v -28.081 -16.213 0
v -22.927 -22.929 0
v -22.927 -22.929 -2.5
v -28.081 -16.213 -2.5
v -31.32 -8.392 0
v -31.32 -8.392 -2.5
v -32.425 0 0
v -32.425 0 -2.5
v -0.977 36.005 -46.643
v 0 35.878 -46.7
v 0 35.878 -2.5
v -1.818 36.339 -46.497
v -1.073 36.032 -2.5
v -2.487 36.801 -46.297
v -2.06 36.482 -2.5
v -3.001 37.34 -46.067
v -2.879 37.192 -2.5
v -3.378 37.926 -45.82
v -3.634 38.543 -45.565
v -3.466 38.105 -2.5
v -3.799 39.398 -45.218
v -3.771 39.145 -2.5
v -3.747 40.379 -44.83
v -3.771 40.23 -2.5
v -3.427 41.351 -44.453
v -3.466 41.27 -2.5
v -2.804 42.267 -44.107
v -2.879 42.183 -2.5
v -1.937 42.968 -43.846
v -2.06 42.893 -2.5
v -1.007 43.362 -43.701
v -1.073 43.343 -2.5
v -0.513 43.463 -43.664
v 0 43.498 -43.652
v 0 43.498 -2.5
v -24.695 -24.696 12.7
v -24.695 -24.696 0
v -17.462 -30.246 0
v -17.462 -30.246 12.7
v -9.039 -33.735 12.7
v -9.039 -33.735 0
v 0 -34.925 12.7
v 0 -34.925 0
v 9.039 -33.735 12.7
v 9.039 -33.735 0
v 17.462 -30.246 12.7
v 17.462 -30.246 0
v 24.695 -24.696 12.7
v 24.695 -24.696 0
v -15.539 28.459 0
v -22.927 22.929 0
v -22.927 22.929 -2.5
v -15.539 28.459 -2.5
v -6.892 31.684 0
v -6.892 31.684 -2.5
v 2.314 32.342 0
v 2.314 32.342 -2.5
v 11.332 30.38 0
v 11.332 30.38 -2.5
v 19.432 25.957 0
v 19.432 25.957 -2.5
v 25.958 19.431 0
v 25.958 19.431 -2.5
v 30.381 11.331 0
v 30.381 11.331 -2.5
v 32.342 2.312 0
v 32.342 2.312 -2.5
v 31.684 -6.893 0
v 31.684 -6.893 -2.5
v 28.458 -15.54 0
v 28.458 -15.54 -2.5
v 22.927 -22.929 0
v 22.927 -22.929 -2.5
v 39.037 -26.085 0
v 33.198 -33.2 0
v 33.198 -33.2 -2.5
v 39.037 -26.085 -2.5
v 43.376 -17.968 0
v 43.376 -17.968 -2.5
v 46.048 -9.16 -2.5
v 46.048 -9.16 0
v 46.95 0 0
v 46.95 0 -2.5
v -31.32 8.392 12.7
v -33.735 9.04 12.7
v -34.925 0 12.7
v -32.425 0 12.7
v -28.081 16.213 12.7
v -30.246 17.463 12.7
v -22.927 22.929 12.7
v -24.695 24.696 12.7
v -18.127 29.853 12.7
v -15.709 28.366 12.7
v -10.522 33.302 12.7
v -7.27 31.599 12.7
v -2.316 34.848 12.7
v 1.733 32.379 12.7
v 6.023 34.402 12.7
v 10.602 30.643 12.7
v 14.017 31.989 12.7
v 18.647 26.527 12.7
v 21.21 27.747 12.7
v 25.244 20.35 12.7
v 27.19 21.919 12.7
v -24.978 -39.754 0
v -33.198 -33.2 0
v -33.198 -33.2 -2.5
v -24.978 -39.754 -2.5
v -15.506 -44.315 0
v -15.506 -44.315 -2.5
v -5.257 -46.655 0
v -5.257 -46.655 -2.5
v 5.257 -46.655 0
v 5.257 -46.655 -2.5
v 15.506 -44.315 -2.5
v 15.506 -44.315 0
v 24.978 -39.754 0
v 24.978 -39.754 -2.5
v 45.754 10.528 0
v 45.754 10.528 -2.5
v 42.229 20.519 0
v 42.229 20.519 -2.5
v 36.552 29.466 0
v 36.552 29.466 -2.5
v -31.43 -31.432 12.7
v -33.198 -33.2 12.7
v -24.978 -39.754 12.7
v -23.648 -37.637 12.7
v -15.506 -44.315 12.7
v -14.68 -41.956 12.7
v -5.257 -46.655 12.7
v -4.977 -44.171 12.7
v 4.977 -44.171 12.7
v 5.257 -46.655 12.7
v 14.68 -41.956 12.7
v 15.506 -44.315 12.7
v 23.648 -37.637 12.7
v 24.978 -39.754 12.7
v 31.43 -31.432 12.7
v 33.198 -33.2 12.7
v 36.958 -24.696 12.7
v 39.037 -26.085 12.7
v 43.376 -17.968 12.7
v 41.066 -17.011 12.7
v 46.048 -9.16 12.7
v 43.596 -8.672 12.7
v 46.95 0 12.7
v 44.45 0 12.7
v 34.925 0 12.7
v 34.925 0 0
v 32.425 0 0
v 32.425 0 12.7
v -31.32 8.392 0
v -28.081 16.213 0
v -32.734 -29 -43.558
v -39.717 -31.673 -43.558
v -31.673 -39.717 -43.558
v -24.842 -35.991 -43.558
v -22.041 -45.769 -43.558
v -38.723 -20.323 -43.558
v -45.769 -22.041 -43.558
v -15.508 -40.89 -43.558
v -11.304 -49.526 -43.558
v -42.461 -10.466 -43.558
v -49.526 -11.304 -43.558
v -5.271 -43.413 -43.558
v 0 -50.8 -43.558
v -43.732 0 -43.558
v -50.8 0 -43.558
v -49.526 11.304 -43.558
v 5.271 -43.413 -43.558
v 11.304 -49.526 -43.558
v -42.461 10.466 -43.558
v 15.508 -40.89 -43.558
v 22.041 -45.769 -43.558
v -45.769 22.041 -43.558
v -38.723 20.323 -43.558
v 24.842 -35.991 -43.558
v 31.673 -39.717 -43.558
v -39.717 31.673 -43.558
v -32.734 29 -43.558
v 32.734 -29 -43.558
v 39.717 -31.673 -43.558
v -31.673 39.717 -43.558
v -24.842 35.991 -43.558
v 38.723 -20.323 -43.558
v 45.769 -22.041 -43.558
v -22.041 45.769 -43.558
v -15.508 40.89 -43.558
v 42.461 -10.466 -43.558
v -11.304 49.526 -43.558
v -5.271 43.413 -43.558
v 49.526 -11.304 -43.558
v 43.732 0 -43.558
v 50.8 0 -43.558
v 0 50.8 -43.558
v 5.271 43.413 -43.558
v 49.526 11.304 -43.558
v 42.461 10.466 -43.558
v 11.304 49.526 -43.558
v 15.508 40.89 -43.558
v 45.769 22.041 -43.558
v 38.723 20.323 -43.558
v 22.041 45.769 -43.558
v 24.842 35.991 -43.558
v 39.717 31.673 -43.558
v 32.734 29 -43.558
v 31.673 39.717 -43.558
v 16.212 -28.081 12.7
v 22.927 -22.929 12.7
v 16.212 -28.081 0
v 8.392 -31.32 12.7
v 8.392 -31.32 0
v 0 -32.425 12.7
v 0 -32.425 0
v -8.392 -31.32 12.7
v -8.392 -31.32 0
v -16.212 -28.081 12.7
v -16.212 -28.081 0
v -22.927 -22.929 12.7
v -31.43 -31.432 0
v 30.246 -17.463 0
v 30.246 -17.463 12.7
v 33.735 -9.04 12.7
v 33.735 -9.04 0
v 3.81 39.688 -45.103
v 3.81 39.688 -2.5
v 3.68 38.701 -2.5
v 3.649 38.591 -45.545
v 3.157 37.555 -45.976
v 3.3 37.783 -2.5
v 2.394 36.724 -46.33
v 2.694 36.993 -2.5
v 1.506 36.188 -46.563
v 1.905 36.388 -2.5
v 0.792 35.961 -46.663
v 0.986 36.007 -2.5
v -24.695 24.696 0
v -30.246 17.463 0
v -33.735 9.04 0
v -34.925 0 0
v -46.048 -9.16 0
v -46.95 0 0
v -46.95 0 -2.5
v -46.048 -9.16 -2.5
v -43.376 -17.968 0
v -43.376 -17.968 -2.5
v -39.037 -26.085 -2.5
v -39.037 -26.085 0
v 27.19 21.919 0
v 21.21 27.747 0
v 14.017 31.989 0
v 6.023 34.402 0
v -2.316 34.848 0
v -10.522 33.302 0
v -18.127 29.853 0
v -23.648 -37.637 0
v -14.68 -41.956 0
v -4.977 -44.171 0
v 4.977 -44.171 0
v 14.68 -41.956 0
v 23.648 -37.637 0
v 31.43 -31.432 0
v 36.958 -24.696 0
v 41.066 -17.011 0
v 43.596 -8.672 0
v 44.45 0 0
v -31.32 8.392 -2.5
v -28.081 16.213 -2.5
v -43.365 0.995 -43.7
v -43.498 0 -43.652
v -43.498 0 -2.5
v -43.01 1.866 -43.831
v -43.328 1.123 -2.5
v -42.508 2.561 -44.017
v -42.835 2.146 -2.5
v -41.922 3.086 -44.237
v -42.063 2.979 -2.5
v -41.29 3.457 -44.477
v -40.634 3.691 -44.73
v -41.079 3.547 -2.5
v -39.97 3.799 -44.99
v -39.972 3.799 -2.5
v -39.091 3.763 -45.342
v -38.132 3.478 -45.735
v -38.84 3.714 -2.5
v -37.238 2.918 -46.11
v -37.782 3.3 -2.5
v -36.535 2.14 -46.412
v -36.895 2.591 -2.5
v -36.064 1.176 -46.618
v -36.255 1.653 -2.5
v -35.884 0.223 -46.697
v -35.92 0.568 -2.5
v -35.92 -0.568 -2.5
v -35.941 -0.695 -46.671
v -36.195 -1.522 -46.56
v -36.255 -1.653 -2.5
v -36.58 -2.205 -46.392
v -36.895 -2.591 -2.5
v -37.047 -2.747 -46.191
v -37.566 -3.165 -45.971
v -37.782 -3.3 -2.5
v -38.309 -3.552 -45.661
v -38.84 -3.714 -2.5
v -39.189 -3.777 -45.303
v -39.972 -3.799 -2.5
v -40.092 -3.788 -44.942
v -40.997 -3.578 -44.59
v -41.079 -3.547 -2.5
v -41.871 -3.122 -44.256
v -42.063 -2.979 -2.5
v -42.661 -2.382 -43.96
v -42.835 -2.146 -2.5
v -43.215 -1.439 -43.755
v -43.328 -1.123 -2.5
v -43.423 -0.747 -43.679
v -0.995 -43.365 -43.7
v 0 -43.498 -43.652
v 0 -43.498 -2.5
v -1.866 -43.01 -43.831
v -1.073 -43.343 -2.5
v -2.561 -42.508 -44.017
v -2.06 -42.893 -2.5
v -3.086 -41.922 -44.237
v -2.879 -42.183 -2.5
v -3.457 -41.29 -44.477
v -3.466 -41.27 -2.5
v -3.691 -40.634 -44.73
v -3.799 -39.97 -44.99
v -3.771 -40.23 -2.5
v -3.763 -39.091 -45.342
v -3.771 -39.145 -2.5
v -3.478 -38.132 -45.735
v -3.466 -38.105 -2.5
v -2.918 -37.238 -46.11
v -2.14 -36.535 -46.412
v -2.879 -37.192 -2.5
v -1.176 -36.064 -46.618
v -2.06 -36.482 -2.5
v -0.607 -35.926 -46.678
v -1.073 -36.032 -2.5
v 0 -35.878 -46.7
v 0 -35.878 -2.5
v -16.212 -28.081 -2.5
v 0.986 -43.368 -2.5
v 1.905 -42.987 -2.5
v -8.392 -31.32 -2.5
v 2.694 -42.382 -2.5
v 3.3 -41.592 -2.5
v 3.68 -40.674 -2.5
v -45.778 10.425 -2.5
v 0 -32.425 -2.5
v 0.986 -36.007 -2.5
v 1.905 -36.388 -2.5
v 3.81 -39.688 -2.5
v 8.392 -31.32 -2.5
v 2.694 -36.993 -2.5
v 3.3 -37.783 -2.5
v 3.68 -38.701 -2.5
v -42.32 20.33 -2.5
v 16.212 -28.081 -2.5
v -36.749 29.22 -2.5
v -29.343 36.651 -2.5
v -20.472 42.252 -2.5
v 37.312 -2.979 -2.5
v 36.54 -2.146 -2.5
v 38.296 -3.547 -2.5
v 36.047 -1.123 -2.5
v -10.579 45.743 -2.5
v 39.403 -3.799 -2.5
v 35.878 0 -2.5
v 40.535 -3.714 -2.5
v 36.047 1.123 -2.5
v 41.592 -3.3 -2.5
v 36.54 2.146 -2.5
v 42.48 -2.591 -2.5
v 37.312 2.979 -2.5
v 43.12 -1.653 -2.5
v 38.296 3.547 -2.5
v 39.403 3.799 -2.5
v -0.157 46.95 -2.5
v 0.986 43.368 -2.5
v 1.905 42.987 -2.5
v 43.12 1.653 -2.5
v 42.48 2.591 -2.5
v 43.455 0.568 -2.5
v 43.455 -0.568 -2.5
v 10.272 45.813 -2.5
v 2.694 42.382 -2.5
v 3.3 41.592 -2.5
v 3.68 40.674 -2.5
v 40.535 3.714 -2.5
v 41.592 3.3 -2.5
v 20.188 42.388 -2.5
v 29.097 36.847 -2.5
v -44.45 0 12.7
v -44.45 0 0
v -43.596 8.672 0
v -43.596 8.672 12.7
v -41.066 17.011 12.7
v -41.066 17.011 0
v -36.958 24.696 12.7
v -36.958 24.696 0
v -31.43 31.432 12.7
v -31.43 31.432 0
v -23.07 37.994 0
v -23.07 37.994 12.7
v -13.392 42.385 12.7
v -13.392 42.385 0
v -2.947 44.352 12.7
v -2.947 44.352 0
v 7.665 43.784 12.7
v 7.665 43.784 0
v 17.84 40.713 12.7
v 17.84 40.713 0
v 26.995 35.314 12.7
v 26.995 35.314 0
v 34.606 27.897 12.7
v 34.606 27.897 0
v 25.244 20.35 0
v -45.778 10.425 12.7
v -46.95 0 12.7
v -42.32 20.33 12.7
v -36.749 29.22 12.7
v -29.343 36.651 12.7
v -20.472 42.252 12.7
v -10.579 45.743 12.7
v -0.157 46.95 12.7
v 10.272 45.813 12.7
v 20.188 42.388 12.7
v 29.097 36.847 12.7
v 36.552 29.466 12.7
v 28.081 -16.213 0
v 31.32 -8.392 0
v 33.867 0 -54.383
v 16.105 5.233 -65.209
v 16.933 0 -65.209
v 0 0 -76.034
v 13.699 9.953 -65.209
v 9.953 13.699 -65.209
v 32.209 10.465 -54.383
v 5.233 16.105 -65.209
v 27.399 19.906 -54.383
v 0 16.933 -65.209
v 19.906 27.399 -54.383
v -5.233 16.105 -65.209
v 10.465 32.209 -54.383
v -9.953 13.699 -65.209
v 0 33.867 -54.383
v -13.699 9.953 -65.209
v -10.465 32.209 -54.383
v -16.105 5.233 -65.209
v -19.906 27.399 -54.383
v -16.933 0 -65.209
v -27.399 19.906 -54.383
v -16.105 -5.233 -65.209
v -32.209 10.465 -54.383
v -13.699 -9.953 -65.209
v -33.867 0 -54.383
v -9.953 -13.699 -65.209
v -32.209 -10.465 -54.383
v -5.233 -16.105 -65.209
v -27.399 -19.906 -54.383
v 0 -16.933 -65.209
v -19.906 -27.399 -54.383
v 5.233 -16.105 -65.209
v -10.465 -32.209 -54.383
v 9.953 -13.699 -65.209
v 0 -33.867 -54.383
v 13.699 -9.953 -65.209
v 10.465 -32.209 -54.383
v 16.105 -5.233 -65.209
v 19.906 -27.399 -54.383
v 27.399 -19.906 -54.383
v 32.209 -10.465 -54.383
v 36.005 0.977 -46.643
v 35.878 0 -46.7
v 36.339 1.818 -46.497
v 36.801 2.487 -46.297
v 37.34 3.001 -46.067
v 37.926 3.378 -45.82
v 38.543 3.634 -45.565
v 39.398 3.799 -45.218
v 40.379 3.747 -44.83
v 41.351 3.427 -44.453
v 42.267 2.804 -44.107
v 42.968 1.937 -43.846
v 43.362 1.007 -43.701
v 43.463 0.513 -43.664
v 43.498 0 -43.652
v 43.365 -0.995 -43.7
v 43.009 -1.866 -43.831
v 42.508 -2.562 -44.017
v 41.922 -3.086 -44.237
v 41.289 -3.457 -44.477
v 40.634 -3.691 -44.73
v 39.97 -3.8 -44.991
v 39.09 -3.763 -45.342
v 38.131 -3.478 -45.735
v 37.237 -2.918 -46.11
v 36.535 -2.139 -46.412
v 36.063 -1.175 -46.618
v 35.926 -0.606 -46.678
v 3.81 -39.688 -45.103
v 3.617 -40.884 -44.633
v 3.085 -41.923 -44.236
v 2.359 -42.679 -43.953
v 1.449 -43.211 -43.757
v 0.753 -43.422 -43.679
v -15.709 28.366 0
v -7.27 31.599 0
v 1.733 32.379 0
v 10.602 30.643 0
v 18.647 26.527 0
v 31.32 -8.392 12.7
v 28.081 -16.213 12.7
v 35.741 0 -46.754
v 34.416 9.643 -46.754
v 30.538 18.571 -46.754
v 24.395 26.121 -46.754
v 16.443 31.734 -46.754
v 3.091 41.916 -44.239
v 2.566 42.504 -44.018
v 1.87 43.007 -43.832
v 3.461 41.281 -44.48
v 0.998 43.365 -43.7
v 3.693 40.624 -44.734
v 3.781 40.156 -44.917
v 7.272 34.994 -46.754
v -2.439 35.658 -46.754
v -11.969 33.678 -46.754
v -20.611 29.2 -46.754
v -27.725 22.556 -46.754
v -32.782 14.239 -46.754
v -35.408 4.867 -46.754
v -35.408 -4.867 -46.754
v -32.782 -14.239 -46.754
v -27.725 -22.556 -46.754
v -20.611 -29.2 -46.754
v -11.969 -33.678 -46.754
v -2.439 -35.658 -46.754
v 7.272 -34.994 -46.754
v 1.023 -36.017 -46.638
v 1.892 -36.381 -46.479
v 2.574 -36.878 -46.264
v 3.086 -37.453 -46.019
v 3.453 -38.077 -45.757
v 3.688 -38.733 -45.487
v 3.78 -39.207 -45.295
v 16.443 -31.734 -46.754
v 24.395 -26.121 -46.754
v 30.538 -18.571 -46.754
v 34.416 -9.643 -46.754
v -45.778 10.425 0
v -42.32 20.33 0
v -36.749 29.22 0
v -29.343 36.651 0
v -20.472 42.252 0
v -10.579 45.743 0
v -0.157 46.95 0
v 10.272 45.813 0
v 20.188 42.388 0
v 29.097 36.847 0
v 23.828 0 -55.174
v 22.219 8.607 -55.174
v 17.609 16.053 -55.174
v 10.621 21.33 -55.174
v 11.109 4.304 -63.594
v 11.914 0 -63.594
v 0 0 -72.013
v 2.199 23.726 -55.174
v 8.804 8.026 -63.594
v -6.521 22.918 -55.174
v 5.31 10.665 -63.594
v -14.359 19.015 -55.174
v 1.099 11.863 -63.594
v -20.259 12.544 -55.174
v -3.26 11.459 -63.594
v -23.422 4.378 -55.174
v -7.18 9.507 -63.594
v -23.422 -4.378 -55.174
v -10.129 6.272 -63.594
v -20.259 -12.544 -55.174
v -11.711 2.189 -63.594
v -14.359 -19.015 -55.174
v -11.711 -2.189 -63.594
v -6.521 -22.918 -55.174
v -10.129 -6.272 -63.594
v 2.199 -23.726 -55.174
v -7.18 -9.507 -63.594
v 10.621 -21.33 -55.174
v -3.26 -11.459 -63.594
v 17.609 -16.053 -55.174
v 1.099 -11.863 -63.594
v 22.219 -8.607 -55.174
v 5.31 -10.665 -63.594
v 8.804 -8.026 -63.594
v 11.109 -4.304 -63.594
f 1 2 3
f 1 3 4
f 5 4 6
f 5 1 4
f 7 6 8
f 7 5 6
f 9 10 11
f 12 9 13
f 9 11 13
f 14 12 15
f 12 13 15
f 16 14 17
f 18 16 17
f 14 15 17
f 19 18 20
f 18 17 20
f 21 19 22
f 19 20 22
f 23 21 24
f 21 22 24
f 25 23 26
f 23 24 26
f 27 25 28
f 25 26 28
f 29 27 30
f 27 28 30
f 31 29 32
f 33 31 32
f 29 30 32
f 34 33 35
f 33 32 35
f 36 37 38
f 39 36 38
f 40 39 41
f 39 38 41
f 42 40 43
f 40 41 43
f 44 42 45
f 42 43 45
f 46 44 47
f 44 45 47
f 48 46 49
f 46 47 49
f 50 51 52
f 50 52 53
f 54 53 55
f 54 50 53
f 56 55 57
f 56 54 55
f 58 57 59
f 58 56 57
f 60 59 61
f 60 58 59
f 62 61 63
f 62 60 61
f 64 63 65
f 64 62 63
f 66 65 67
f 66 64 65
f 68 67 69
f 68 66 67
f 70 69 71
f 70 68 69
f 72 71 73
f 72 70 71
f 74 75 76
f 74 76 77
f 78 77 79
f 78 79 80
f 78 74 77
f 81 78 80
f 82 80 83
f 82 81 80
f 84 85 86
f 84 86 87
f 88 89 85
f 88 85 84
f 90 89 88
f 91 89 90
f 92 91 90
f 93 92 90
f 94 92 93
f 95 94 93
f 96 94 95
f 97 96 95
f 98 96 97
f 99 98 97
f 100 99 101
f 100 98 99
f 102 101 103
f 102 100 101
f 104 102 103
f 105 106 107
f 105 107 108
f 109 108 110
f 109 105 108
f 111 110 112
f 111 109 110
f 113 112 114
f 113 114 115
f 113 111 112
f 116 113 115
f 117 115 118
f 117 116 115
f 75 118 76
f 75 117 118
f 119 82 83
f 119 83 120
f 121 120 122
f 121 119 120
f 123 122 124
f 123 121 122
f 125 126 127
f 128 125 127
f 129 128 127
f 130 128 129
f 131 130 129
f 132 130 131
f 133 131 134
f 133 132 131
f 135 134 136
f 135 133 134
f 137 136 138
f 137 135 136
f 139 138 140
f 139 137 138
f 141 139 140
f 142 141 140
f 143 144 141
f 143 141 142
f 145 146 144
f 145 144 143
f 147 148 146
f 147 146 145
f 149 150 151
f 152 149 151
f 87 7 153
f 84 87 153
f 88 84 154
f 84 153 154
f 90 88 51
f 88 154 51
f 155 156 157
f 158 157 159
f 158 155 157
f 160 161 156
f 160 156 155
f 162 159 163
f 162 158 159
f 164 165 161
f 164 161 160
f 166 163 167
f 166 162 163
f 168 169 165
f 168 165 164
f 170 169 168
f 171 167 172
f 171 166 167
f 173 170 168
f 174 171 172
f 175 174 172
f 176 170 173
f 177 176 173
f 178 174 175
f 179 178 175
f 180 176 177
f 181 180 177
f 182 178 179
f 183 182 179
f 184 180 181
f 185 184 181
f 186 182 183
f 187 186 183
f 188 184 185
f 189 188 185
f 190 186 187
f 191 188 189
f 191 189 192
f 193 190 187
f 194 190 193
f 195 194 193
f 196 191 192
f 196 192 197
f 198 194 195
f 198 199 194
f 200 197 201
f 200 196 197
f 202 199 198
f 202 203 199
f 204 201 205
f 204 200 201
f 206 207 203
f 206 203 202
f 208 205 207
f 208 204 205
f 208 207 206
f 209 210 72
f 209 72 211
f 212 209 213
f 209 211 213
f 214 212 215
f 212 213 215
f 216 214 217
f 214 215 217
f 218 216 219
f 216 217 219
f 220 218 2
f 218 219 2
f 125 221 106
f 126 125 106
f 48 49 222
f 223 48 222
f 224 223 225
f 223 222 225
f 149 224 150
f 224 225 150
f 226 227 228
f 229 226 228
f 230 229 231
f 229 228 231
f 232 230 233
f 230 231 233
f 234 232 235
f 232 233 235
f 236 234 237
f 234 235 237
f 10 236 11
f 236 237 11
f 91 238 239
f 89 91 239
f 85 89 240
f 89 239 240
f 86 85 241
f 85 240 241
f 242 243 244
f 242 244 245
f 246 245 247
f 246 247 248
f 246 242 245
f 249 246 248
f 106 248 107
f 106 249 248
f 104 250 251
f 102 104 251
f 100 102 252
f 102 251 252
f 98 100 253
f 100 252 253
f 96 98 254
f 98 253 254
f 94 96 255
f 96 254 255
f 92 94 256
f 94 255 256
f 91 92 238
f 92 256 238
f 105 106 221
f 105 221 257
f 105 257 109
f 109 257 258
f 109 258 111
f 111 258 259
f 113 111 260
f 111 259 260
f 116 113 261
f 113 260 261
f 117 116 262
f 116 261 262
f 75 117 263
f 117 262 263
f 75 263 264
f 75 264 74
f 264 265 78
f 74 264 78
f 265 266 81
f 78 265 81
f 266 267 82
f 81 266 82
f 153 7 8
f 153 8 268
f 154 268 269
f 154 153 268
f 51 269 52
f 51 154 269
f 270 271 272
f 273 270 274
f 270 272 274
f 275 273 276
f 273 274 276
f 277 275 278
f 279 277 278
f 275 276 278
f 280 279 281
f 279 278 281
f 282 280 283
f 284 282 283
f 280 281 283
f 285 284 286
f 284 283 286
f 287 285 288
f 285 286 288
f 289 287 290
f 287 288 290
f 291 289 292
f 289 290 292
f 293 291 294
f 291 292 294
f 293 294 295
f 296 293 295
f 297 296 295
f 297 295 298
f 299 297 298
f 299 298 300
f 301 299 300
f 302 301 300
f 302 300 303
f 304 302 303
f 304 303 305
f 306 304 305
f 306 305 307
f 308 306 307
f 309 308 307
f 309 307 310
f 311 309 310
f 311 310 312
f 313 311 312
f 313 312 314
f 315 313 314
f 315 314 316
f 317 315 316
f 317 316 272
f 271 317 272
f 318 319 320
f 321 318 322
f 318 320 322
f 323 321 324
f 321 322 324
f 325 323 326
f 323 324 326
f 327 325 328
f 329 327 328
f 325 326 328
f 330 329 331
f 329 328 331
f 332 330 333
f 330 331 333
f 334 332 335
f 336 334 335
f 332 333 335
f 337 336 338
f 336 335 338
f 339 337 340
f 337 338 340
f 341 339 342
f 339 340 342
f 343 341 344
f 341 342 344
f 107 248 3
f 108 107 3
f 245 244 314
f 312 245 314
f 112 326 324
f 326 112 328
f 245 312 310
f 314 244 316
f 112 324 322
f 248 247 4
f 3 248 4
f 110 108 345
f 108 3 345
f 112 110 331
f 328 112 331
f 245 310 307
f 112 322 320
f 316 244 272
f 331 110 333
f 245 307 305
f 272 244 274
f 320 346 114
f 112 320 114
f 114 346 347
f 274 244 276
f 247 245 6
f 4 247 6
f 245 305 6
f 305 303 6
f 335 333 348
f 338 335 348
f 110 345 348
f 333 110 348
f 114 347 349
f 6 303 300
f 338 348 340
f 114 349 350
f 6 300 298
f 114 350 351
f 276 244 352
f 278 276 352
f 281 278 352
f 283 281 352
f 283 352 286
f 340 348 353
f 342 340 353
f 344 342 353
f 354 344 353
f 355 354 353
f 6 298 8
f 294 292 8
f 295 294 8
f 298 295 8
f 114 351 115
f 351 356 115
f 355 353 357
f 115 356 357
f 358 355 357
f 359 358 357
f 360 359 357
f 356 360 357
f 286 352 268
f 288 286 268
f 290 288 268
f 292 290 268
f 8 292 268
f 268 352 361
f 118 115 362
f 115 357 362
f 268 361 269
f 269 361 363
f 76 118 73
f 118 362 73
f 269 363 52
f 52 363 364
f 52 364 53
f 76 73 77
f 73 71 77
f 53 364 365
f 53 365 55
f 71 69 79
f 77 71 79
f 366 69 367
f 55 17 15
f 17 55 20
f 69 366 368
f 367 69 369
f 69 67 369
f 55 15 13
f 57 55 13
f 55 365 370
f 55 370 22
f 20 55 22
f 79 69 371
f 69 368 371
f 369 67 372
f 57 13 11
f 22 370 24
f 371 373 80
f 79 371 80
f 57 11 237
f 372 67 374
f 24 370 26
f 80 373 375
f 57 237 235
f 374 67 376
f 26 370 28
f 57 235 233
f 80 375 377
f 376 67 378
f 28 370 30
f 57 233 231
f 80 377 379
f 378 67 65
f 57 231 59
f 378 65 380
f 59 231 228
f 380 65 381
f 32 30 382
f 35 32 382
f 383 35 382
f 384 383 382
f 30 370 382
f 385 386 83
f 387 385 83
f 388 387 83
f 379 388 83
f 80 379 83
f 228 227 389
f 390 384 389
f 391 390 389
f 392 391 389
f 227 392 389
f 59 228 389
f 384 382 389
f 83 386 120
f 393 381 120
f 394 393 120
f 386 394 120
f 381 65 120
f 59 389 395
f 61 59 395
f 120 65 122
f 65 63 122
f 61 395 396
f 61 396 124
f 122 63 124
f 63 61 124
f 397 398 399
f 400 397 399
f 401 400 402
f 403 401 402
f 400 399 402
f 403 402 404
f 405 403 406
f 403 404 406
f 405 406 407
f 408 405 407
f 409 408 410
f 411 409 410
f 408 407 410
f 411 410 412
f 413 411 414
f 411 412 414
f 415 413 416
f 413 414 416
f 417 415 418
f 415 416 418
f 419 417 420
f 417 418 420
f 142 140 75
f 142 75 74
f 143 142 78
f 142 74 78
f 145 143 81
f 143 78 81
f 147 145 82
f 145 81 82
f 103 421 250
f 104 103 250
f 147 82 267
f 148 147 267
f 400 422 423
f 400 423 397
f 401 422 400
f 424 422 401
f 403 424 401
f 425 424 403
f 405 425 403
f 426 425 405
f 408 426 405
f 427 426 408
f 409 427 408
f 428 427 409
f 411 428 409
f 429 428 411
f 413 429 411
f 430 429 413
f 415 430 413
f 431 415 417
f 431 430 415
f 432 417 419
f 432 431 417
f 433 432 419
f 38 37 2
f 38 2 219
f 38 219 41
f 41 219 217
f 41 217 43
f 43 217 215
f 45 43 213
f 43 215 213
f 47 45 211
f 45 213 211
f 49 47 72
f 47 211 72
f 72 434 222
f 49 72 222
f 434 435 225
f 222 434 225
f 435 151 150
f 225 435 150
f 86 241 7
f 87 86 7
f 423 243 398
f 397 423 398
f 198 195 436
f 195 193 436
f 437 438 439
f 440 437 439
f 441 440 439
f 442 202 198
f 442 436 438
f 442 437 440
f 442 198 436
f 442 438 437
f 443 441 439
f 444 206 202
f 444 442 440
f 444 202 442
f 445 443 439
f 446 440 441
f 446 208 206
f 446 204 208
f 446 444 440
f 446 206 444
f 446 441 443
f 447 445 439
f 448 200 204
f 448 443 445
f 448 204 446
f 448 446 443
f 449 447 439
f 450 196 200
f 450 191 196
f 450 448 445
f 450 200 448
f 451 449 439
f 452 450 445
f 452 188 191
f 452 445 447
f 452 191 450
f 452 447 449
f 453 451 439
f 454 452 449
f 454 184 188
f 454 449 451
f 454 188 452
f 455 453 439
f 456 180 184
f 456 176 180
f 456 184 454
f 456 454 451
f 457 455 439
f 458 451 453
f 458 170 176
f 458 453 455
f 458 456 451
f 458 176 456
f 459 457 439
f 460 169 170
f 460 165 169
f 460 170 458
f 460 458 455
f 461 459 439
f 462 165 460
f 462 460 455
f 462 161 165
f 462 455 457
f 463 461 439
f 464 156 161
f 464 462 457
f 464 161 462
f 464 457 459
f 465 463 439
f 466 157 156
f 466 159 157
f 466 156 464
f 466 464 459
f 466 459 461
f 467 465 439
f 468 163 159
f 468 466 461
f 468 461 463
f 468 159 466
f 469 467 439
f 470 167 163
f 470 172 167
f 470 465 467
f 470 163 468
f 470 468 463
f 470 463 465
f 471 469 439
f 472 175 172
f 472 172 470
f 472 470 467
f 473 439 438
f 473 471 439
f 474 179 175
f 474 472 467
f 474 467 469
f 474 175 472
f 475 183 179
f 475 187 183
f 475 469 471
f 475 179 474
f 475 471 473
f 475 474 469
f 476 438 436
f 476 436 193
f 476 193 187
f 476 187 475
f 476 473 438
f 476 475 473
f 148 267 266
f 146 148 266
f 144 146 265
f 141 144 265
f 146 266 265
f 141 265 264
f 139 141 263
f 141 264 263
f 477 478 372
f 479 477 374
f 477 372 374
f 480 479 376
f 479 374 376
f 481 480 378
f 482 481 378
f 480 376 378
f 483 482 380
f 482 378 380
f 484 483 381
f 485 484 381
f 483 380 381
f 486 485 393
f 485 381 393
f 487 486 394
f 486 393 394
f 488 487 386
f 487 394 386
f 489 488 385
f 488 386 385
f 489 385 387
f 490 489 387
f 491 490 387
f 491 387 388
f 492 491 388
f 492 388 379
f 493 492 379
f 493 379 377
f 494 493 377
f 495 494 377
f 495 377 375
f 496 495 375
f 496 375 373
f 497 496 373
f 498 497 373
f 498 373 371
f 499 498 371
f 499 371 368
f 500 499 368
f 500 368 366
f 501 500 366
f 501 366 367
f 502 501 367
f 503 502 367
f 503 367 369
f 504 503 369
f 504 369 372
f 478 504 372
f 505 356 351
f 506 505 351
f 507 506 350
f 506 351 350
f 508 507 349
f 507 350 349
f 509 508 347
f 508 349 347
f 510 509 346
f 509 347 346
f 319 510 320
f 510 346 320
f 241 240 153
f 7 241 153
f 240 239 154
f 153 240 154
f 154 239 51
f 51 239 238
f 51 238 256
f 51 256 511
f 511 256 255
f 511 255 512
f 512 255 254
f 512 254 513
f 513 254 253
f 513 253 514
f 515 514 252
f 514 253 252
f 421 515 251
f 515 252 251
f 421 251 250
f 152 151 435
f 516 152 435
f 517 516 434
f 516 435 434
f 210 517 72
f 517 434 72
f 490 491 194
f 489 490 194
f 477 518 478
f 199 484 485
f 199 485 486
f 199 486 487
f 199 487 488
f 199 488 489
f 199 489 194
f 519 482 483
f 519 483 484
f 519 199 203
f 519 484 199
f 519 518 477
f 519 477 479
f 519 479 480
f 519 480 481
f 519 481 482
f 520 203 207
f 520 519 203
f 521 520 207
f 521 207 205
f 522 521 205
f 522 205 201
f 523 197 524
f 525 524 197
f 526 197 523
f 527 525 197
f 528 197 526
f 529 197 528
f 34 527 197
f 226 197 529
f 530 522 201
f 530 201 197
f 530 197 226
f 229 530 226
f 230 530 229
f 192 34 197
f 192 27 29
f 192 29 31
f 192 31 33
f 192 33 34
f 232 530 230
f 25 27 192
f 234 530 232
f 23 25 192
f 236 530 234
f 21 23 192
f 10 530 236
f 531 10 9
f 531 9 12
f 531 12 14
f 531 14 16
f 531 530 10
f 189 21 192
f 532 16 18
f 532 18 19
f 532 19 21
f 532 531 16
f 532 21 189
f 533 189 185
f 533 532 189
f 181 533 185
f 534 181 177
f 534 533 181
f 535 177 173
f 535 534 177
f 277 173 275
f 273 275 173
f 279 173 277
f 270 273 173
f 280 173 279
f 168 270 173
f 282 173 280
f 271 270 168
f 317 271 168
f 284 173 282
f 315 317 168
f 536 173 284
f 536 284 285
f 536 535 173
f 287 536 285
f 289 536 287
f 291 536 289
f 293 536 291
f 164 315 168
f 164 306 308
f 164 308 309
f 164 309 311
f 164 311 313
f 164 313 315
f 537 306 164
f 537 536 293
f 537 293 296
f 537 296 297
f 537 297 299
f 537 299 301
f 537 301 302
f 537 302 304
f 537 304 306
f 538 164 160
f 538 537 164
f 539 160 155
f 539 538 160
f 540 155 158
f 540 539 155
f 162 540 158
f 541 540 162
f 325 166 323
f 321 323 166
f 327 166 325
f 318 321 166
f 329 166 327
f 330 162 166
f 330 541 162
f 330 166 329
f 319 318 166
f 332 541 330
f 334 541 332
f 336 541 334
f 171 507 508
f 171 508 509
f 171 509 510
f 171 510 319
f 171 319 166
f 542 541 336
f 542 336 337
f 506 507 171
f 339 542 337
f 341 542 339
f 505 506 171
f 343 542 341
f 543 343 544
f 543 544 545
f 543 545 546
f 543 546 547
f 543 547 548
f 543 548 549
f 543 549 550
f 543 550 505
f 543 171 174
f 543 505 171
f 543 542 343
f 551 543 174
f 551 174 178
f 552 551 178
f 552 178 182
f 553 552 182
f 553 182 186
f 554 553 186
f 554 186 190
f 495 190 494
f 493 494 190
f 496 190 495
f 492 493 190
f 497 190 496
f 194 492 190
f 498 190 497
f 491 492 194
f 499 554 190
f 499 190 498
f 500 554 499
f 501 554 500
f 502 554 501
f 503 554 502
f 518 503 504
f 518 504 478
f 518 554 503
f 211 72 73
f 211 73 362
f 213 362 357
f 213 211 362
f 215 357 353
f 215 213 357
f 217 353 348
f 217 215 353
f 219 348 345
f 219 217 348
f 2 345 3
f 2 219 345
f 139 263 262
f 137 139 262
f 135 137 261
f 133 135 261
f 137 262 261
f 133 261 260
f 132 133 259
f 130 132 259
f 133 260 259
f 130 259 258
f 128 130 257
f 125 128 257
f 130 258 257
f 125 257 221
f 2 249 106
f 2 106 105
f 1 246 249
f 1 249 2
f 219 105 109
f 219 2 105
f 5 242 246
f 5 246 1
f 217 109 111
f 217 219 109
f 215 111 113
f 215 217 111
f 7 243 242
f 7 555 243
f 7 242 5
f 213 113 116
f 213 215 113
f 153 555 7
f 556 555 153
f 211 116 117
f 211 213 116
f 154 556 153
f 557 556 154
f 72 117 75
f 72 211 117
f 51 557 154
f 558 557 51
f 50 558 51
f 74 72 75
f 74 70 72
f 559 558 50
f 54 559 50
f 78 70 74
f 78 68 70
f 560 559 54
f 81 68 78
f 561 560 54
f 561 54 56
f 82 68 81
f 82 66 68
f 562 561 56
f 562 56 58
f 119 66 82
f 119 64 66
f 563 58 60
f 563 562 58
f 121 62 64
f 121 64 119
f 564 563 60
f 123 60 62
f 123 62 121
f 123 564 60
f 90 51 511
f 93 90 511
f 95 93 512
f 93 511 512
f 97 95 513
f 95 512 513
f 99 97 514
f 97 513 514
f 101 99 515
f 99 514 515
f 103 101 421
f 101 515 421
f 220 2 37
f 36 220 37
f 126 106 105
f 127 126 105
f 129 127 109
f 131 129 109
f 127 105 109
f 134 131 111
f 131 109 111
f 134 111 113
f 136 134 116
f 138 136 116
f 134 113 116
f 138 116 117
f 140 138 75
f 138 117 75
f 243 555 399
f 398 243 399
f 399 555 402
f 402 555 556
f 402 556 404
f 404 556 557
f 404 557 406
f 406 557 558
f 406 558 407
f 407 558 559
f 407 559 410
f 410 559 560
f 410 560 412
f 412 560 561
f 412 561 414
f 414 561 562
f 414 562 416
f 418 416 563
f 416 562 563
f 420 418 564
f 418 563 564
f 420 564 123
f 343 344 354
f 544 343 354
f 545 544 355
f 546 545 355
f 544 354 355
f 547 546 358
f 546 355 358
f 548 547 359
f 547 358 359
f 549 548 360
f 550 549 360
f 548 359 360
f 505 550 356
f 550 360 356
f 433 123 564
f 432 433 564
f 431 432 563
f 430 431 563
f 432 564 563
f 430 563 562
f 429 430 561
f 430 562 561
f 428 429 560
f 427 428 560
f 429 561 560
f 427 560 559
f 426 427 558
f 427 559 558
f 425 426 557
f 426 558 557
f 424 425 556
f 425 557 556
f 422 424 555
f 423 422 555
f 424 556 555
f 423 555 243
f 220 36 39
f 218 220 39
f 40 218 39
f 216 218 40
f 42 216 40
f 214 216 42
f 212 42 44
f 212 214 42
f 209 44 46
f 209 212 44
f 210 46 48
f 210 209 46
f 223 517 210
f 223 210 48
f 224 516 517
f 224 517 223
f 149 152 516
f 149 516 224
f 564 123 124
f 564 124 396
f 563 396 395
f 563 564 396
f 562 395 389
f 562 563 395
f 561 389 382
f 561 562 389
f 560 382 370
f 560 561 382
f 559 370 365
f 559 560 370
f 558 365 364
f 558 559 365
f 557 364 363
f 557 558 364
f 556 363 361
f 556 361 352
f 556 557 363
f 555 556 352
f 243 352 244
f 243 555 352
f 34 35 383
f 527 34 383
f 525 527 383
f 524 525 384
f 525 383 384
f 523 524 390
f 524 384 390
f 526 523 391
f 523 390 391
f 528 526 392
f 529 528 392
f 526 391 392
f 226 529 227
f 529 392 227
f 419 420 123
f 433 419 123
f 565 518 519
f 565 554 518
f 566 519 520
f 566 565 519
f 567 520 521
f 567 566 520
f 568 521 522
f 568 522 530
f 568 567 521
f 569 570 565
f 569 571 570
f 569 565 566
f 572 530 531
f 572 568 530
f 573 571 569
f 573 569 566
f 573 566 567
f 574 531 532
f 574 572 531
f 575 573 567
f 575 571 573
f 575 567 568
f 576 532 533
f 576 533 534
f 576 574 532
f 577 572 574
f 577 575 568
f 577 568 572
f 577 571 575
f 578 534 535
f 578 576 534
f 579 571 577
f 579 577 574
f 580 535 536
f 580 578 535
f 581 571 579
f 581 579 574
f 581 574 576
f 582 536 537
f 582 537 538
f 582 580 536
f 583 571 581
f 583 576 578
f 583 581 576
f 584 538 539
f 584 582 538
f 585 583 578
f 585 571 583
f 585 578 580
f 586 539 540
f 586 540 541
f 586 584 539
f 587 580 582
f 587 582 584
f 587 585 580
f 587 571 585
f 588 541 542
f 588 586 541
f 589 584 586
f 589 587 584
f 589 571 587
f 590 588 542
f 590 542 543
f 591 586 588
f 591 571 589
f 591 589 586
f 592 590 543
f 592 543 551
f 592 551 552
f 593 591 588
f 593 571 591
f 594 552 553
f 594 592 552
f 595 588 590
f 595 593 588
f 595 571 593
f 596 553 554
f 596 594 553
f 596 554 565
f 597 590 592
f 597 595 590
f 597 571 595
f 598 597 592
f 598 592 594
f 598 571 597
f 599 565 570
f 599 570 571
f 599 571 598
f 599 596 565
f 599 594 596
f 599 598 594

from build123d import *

# Parameters (mm, degrees)
F1_DEPTH = 12.7
F2_DEPTH = 2.5
F4_DEPTH = 44.45


# Not quite as in the source:
# - a length typed as a fraction of an inch, garbled in the dataset ("3 / 203.2 mm" for 3/8 in), is restored


with BuildPart() as f1:
    # F0 (on Top) → F1 (new body)
    with BuildSketch(Plane.XY):
        with BuildLine():
            Line((33.1977999888, -33.1995267422), (31.4300790096, -31.4317138166))
            ThreePointArc((31.4300790096, -31.4317138166), (0, -44.45), (-31.4300790096, -31.4317138166))
            Line((-31.4300790096, -31.4317138166), (-33.1977999888, -33.1995267422))
            ThreePointArc((-33.1977999888, -33.1995267422), (0, -46.95), (33.1977999888, -33.1995267422))
        make_face()
        with BuildLine():
            Line((46.95, 0), (44.45, 0))
            ThreePointArc((44.45, 0), (41.0662240289, -17.0108125618), (31.4300790096, -31.4317138166))
            Line((31.4300790096, -31.4317138166), (33.1977999888, -33.1995267422))
            ThreePointArc((33.1977999888, -33.1995267422), (43.3759104197, -17.967551176), (46.95, 0))
        make_face()
    extrude(amount=F1_DEPTH)


with BuildPart() as f1b:
    # F0 (on Top) → F1, piece 2 (new body)
    with BuildSketch(Plane.XY):
        with BuildLine():
            ThreePointArc((-31.4300790096, 31.4317138166), (2.3760514819, 44.3864492763), (34.6059908934, 27.8967362658))
            Line((34.6059908934, 27.8967362658), (36.5523345882, 29.4657315563))
            ThreePointArc((36.5523345882, 29.4657315563), (2.5096876732, 46.8828749949), (-33.1977999888, 33.1995267422))
            Line((-33.1977999888, 33.1995267422), (-31.4300790096, 31.4317138166))
        make_face()
        with BuildLine():
            ThreePointArc((-44.45, 0), (-41.0662240289, 17.0108125618), (-31.4300790096, 31.4317138166))
            Line((-31.4300790096, 31.4317138166), (-33.1977999888, 33.1995267422))
            ThreePointArc((-33.1977999888, 33.1995267422), (-43.3759104197, 17.967551176), (-46.95, 0))
            Line((-46.95, 0), (-44.45, 0))
        make_face()
    extrude(amount=F1_DEPTH)


with BuildPart() as f1c:
    # F0 (on Top) → F1, piece 3 (new body)
    with BuildSketch(Plane.XY):
        with BuildLine():
            ThreePointArc((-24.695062079, -24.6963465702), (0, -34.925), (24.695062079, -24.6963465702))
            Line((24.695062079, -24.6963465702), (23.4743895005, -23.4756104995))
            Line((23.4743895005, -23.4756104995), (22.9273410998, -22.9285336446))
            ThreePointArc((22.9273410998, -22.9285336446), (0, -32.425), (-22.9273410998, -22.9285336446))
            Line((-22.9273410998, -22.9285336446), (-24.695062079, -24.6963465702))
        make_face()
        with BuildLine():
            ThreePointArc((24.695062079, -24.6963465702), (32.2663188798, -13.3656384414), (34.925, 0))
            Line((34.925, 0), (32.425, 0))
            ThreePointArc((32.425, 0), (29.956632489, -12.4088998271), (22.9273410998, -22.9285336446))
            Line((22.9273410998, -22.9285336446), (23.4743895005, -23.4756104995))
            Line((23.4743895005, -23.4756104995), (24.695062079, -24.6963465702))
        make_face()
    extrude(amount=F1_DEPTH)


with BuildPart() as f1d:
    # F0 (on Top) → F1, piece 4 (new body)
    with BuildSketch(Plane.XY):
        with BuildLine():
            Line((25.2440777215, 20.3498689183), (27.1904214163, 21.9188642088))
            ThreePointArc((27.1904214163, 21.9188642088), (1.8668975929, 34.8750672885), (-24.695062079, 24.6963465702))
            Line((-24.695062079, 24.6963465702), (-22.9273410998, 22.9285336446))
            ThreePointArc((-22.9273410998, 22.9285336446), (1.7332614016, 32.3786415699), (25.2440777215, 20.3498689183))
        make_face()
        with BuildLine():
            Line((-22.9273410998, 22.9285336446), (-24.695062079, 24.6963465702))
            ThreePointArc((-24.695062079, 24.6963465702), (-32.2663188798, 13.3656384414), (-34.925, 0))
            Line((-34.925, 0), (-32.425, 0))
            ThreePointArc((-32.425, 0), (-29.956632489, 12.4088998271), (-22.9273410998, 22.9285336446))
        make_face()
    extrude(amount=F1_DEPTH)


with BuildPart() as f2:
    # F0 (on Top) → F2 (new body)
    with BuildSketch(Plane.XY):
        with BuildLine():
            Line((-33.1977999888, -33.1995267422), (-31.4300790096, -31.4317138166))
            ThreePointArc((-31.4300790096, -31.4317138166), (-41.0662240289, -17.0108125618), (-44.45, 0))
            Line((-44.45, 0), (-46.95, 0))
            ThreePointArc((-46.95, 0), (-43.3759104197, -17.967551176), (-33.1977999888, -33.1995267422))
        make_face()
        with BuildLine():
            Line((33.1977999888, -33.1995267422), (31.4300790096, -31.4317138166))
            ThreePointArc((31.4300790096, -31.4317138166), (0, -44.45), (-31.4300790096, -31.4317138166))
            Line((-31.4300790096, -31.4317138166), (-33.1977999888, -33.1995267422))
            ThreePointArc((-33.1977999888, -33.1995267422), (0, -46.95), (33.1977999888, -33.1995267422))
        make_face()
        with BuildLine():
            Line((-31.4300790096, -31.4317138166), (-24.695062079, -24.6963465702))
            ThreePointArc((-24.695062079, -24.6963465702), (-32.2663188798, -13.3656384414), (-34.925, 0))
            Line((-34.925, 0), (-44.45, 0))
            ThreePointArc((-44.45, 0), (-41.0662240289, -17.0108125618), (-31.4300790096, -31.4317138166))
        make_face()
        with BuildLine():
            Line((31.4300790096, -31.4317138166), (24.695062079, -24.6963465702))
            ThreePointArc((24.695062079, -24.6963465702), (0, -34.925), (-24.695062079, -24.6963465702))
            Line((-24.695062079, -24.6963465702), (-31.4300790096, -31.4317138166))
            ThreePointArc((-31.4300790096, -31.4317138166), (0, -44.45), (31.4300790096, -31.4317138166))
        make_face()
        with BuildLine():
            Line((44.45, 0), (34.925, 0))
            ThreePointArc((34.925, 0), (32.2663188798, -13.3656384414), (24.695062079, -24.6963465702))
            Line((24.695062079, -24.6963465702), (31.4300790096, -31.4317138166))
            ThreePointArc((31.4300790096, -31.4317138166), (41.0662240289, -17.0108125618), (44.45, 0))
        make_face()
        with BuildLine():
            ThreePointArc((-24.695062079, -24.6963465702), (0, -34.925), (24.695062079, -24.6963465702))
            Line((24.695062079, -24.6963465702), (23.4743895005, -23.4756104995))
            Line((23.4743895005, -23.4756104995), (22.9273410998, -22.9285336446))
            ThreePointArc((22.9273410998, -22.9285336446), (0, -32.425), (-22.9273410998, -22.9285336446))
            Line((-22.9273410998, -22.9285336446), (-24.695062079, -24.6963465702))
        make_face()
        with BuildLine():
            ThreePointArc((-34.925, 0), (-32.2663188798, -13.3656384414), (-24.695062079, -24.6963465702))
            Line((-24.695062079, -24.6963465702), (-22.9273410998, -22.9285336446))
            ThreePointArc((-22.9273410998, -22.9285336446), (-29.956632489, -12.4088998271), (-32.425, 0))
            Line((-32.425, 0), (-34.925, 0))
        make_face()
        with BuildLine():
            ThreePointArc((24.695062079, -24.6963465702), (32.2663188798, -13.3656384414), (34.925, 0))
            Line((34.925, 0), (32.425, 0))
            ThreePointArc((32.425, 0), (29.956632489, -12.4088998271), (22.9273410998, -22.9285336446))
            Line((22.9273410998, -22.9285336446), (23.4743895005, -23.4756104995))
            Line((23.4743895005, -23.4756104995), (24.695062079, -24.6963465702))
        make_face()
        with BuildLine():
            Line((46.95, 0), (44.45, 0))
            ThreePointArc((44.45, 0), (41.0662240289, -17.0108125618), (31.4300790096, -31.4317138166))
            Line((31.4300790096, -31.4317138166), (33.1977999888, -33.1995267422))
            ThreePointArc((33.1977999888, -33.1995267422), (43.3759104197, -17.967551176), (46.95, 0))
        make_face()
        with BuildLine():
            ThreePointArc((34.6059908934, 27.8967362658), (41.9168152131, 14.7913184806), (44.45, 0))
            Line((44.45, 0), (46.95, 0))
            ThreePointArc((46.95, 0), (44.274341378, 15.6232261566), (36.5523345882, 29.4657315563))
            Line((36.5523345882, 29.4657315563), (34.6059908934, 27.8967362658))
        make_face()
        with BuildLine():
            ThreePointArc((27.1904214163, 21.9188642088), (32.9346405246, 11.6217502347), (34.925, 0))
            Line((34.925, 0), (44.45, 0))
            ThreePointArc((44.45, 0), (41.9168152131, 14.7913184806), (34.6059908934, 27.8967362658))
            Line((34.6059908934, 27.8967362658), (27.1904214163, 21.9188642088))
        make_face()
        with BuildLine():
            Line((32.425, 0), (34.925, 0))
            ThreePointArc((34.925, 0), (32.9346405246, 11.6217502347), (27.1904214163, 21.9188642088))
            Line((27.1904214163, 21.9188642088), (25.2440777215, 20.3498689183))
            ThreePointArc((25.2440777215, 20.3498689183), (30.5771143596, 10.7898425587), (32.425, 0))
        make_face()
        with BuildLine():
            ThreePointArc((-24.695062079, 24.6963465702), (1.8668975929, 34.8750672885), (27.1904214163, 21.9188642088))
            Line((27.1904214163, 21.9188642088), (34.6059908934, 27.8967362658))
            ThreePointArc((34.6059908934, 27.8967362658), (2.3760514819, 44.3864492763), (-31.4300790096, 31.4317138166))
            Line((-31.4300790096, 31.4317138166), (-24.695062079, 24.6963465702))
        make_face()
        with BuildLine():
            ThreePointArc((-34.925, 0), (-32.2663188798, 13.3656384414), (-24.695062079, 24.6963465702))
            Line((-24.695062079, 24.6963465702), (-31.4300790096, 31.4317138166))
            ThreePointArc((-31.4300790096, 31.4317138166), (-41.0662240289, 17.0108125618), (-44.45, 0))
            Line((-44.45, 0), (-34.925, 0))
        make_face()
        with BuildLine():
            Line((-22.9273410998, 22.9285336446), (-24.695062079, 24.6963465702))
            ThreePointArc((-24.695062079, 24.6963465702), (-32.2663188798, 13.3656384414), (-34.925, 0))
            Line((-34.925, 0), (-32.425, 0))
            ThreePointArc((-32.425, 0), (-29.956632489, 12.4088998271), (-22.9273410998, 22.9285336446))
        make_face()
        with BuildLine():
            Line((25.2440777215, 20.3498689183), (27.1904214163, 21.9188642088))
            ThreePointArc((27.1904214163, 21.9188642088), (1.8668975929, 34.8750672885), (-24.695062079, 24.6963465702))
            Line((-24.695062079, 24.6963465702), (-22.9273410998, 22.9285336446))
            ThreePointArc((-22.9273410998, 22.9285336446), (1.7332614016, 32.3786415699), (25.2440777215, 20.3498689183))
        make_face()
        with BuildLine():
            ThreePointArc((-44.45, 0), (-41.0662240289, 17.0108125618), (-31.4300790096, 31.4317138166))
            Line((-31.4300790096, 31.4317138166), (-33.1977999888, 33.1995267422))
            ThreePointArc((-33.1977999888, 33.1995267422), (-43.3759104197, 17.967551176), (-46.95, 0))
            Line((-46.95, 0), (-44.45, 0))
        make_face()
        with BuildLine():
            ThreePointArc((-31.4300790096, 31.4317138166), (2.3760514819, 44.3864492763), (34.6059908934, 27.8967362658))
            Line((34.6059908934, 27.8967362658), (36.5523345882, 29.4657315563))
            ThreePointArc((36.5523345882, 29.4657315563), (2.5096876732, 46.8828749949), (-33.1977999888, 33.1995267422))
            Line((-33.1977999888, 33.1995267422), (-31.4300790096, 31.4317138166))
        make_face()
    extrude(amount=-F2_DEPTH)

    # F3 (on face) → F4 (join)
    with BuildSketch(Plane(origin=(0, 0, -2.5), x_dir=(1, 0, 0), z_dir=(0, 0, -1))):
        with BuildLine():
            Line((0, 39.6875), (0, 43.4975))
            ThreePointArc((0, 43.4975), (-3.81, 39.6875), (0, 35.8775))
            Line((0, 35.8775), (0, 39.6875))
        make_face()
        with BuildLine():
            ThreePointArc((3.81, 39.6875), (2.6940768363, 42.3815768363), (0, 43.4975))
            Line((0, 43.4975), (0, 39.6875))
            Line((0, 39.6875), (0, 35.8775))
            ThreePointArc((0, 35.8775), (2.6940768363, 36.9934231637), (3.81, 39.6875))
        make_face()
        with BuildLine():
            Line((35.8775, 0), (43.4975, 0))
            ThreePointArc((43.4975, 0), (39.6875, 3.81), (35.8775, 0))
        make_face()
        with BuildLine():
            ThreePointArc((35.8775, 0), (39.6875, -3.81), (43.4975, 0))
            Line((43.4975, 0), (35.8775, 0))
        make_face()
        with BuildLine():
            ThreePointArc((-35.8775, 0), (-39.6875, 3.81), (-43.4975, 0))
            Line((-43.4975, 0), (-35.8775, 0))
        make_face()
        with BuildLine():
            Line((-35.8775, 0), (-43.4975, 0))
            ThreePointArc((-43.4975, 0), (-39.6875, -3.81), (-35.8775, 0))
        make_face()
        with BuildLine():
            ThreePointArc((0, -35.8775), (-3.81, -39.6875), (0, -43.4975))
            Line((0, -43.4975), (0, -35.8775))
        make_face()
        with BuildLine():
            Line((0, -35.8775), (0, -43.4975))
            ThreePointArc((0, -43.4975), (2.6940768363, -42.3815768363), (3.81, -39.6875))
            ThreePointArc((3.81, -39.6875), (2.6940768363, -36.9934231637), (0, -35.8775))
        make_face()
    extrude(amount=F4_DEPTH)

    # F5 (on Front) → F6 (revolve)
    with BuildSketch(Plane.XZ):
        Polygon((0, -76.0341584682), (50.8, -43.5579530895), (43.7318012118, -43.5579530895), (35.7412993908, -46.7542223632), (0, -72.013489902), align=None)
    revolve(axis=Axis((0, 0, -74.0238241851), (0, 0, 1)))


solid = Compound([f1.part, f1b.part, f1c.part, f1d.part, f2.part])
